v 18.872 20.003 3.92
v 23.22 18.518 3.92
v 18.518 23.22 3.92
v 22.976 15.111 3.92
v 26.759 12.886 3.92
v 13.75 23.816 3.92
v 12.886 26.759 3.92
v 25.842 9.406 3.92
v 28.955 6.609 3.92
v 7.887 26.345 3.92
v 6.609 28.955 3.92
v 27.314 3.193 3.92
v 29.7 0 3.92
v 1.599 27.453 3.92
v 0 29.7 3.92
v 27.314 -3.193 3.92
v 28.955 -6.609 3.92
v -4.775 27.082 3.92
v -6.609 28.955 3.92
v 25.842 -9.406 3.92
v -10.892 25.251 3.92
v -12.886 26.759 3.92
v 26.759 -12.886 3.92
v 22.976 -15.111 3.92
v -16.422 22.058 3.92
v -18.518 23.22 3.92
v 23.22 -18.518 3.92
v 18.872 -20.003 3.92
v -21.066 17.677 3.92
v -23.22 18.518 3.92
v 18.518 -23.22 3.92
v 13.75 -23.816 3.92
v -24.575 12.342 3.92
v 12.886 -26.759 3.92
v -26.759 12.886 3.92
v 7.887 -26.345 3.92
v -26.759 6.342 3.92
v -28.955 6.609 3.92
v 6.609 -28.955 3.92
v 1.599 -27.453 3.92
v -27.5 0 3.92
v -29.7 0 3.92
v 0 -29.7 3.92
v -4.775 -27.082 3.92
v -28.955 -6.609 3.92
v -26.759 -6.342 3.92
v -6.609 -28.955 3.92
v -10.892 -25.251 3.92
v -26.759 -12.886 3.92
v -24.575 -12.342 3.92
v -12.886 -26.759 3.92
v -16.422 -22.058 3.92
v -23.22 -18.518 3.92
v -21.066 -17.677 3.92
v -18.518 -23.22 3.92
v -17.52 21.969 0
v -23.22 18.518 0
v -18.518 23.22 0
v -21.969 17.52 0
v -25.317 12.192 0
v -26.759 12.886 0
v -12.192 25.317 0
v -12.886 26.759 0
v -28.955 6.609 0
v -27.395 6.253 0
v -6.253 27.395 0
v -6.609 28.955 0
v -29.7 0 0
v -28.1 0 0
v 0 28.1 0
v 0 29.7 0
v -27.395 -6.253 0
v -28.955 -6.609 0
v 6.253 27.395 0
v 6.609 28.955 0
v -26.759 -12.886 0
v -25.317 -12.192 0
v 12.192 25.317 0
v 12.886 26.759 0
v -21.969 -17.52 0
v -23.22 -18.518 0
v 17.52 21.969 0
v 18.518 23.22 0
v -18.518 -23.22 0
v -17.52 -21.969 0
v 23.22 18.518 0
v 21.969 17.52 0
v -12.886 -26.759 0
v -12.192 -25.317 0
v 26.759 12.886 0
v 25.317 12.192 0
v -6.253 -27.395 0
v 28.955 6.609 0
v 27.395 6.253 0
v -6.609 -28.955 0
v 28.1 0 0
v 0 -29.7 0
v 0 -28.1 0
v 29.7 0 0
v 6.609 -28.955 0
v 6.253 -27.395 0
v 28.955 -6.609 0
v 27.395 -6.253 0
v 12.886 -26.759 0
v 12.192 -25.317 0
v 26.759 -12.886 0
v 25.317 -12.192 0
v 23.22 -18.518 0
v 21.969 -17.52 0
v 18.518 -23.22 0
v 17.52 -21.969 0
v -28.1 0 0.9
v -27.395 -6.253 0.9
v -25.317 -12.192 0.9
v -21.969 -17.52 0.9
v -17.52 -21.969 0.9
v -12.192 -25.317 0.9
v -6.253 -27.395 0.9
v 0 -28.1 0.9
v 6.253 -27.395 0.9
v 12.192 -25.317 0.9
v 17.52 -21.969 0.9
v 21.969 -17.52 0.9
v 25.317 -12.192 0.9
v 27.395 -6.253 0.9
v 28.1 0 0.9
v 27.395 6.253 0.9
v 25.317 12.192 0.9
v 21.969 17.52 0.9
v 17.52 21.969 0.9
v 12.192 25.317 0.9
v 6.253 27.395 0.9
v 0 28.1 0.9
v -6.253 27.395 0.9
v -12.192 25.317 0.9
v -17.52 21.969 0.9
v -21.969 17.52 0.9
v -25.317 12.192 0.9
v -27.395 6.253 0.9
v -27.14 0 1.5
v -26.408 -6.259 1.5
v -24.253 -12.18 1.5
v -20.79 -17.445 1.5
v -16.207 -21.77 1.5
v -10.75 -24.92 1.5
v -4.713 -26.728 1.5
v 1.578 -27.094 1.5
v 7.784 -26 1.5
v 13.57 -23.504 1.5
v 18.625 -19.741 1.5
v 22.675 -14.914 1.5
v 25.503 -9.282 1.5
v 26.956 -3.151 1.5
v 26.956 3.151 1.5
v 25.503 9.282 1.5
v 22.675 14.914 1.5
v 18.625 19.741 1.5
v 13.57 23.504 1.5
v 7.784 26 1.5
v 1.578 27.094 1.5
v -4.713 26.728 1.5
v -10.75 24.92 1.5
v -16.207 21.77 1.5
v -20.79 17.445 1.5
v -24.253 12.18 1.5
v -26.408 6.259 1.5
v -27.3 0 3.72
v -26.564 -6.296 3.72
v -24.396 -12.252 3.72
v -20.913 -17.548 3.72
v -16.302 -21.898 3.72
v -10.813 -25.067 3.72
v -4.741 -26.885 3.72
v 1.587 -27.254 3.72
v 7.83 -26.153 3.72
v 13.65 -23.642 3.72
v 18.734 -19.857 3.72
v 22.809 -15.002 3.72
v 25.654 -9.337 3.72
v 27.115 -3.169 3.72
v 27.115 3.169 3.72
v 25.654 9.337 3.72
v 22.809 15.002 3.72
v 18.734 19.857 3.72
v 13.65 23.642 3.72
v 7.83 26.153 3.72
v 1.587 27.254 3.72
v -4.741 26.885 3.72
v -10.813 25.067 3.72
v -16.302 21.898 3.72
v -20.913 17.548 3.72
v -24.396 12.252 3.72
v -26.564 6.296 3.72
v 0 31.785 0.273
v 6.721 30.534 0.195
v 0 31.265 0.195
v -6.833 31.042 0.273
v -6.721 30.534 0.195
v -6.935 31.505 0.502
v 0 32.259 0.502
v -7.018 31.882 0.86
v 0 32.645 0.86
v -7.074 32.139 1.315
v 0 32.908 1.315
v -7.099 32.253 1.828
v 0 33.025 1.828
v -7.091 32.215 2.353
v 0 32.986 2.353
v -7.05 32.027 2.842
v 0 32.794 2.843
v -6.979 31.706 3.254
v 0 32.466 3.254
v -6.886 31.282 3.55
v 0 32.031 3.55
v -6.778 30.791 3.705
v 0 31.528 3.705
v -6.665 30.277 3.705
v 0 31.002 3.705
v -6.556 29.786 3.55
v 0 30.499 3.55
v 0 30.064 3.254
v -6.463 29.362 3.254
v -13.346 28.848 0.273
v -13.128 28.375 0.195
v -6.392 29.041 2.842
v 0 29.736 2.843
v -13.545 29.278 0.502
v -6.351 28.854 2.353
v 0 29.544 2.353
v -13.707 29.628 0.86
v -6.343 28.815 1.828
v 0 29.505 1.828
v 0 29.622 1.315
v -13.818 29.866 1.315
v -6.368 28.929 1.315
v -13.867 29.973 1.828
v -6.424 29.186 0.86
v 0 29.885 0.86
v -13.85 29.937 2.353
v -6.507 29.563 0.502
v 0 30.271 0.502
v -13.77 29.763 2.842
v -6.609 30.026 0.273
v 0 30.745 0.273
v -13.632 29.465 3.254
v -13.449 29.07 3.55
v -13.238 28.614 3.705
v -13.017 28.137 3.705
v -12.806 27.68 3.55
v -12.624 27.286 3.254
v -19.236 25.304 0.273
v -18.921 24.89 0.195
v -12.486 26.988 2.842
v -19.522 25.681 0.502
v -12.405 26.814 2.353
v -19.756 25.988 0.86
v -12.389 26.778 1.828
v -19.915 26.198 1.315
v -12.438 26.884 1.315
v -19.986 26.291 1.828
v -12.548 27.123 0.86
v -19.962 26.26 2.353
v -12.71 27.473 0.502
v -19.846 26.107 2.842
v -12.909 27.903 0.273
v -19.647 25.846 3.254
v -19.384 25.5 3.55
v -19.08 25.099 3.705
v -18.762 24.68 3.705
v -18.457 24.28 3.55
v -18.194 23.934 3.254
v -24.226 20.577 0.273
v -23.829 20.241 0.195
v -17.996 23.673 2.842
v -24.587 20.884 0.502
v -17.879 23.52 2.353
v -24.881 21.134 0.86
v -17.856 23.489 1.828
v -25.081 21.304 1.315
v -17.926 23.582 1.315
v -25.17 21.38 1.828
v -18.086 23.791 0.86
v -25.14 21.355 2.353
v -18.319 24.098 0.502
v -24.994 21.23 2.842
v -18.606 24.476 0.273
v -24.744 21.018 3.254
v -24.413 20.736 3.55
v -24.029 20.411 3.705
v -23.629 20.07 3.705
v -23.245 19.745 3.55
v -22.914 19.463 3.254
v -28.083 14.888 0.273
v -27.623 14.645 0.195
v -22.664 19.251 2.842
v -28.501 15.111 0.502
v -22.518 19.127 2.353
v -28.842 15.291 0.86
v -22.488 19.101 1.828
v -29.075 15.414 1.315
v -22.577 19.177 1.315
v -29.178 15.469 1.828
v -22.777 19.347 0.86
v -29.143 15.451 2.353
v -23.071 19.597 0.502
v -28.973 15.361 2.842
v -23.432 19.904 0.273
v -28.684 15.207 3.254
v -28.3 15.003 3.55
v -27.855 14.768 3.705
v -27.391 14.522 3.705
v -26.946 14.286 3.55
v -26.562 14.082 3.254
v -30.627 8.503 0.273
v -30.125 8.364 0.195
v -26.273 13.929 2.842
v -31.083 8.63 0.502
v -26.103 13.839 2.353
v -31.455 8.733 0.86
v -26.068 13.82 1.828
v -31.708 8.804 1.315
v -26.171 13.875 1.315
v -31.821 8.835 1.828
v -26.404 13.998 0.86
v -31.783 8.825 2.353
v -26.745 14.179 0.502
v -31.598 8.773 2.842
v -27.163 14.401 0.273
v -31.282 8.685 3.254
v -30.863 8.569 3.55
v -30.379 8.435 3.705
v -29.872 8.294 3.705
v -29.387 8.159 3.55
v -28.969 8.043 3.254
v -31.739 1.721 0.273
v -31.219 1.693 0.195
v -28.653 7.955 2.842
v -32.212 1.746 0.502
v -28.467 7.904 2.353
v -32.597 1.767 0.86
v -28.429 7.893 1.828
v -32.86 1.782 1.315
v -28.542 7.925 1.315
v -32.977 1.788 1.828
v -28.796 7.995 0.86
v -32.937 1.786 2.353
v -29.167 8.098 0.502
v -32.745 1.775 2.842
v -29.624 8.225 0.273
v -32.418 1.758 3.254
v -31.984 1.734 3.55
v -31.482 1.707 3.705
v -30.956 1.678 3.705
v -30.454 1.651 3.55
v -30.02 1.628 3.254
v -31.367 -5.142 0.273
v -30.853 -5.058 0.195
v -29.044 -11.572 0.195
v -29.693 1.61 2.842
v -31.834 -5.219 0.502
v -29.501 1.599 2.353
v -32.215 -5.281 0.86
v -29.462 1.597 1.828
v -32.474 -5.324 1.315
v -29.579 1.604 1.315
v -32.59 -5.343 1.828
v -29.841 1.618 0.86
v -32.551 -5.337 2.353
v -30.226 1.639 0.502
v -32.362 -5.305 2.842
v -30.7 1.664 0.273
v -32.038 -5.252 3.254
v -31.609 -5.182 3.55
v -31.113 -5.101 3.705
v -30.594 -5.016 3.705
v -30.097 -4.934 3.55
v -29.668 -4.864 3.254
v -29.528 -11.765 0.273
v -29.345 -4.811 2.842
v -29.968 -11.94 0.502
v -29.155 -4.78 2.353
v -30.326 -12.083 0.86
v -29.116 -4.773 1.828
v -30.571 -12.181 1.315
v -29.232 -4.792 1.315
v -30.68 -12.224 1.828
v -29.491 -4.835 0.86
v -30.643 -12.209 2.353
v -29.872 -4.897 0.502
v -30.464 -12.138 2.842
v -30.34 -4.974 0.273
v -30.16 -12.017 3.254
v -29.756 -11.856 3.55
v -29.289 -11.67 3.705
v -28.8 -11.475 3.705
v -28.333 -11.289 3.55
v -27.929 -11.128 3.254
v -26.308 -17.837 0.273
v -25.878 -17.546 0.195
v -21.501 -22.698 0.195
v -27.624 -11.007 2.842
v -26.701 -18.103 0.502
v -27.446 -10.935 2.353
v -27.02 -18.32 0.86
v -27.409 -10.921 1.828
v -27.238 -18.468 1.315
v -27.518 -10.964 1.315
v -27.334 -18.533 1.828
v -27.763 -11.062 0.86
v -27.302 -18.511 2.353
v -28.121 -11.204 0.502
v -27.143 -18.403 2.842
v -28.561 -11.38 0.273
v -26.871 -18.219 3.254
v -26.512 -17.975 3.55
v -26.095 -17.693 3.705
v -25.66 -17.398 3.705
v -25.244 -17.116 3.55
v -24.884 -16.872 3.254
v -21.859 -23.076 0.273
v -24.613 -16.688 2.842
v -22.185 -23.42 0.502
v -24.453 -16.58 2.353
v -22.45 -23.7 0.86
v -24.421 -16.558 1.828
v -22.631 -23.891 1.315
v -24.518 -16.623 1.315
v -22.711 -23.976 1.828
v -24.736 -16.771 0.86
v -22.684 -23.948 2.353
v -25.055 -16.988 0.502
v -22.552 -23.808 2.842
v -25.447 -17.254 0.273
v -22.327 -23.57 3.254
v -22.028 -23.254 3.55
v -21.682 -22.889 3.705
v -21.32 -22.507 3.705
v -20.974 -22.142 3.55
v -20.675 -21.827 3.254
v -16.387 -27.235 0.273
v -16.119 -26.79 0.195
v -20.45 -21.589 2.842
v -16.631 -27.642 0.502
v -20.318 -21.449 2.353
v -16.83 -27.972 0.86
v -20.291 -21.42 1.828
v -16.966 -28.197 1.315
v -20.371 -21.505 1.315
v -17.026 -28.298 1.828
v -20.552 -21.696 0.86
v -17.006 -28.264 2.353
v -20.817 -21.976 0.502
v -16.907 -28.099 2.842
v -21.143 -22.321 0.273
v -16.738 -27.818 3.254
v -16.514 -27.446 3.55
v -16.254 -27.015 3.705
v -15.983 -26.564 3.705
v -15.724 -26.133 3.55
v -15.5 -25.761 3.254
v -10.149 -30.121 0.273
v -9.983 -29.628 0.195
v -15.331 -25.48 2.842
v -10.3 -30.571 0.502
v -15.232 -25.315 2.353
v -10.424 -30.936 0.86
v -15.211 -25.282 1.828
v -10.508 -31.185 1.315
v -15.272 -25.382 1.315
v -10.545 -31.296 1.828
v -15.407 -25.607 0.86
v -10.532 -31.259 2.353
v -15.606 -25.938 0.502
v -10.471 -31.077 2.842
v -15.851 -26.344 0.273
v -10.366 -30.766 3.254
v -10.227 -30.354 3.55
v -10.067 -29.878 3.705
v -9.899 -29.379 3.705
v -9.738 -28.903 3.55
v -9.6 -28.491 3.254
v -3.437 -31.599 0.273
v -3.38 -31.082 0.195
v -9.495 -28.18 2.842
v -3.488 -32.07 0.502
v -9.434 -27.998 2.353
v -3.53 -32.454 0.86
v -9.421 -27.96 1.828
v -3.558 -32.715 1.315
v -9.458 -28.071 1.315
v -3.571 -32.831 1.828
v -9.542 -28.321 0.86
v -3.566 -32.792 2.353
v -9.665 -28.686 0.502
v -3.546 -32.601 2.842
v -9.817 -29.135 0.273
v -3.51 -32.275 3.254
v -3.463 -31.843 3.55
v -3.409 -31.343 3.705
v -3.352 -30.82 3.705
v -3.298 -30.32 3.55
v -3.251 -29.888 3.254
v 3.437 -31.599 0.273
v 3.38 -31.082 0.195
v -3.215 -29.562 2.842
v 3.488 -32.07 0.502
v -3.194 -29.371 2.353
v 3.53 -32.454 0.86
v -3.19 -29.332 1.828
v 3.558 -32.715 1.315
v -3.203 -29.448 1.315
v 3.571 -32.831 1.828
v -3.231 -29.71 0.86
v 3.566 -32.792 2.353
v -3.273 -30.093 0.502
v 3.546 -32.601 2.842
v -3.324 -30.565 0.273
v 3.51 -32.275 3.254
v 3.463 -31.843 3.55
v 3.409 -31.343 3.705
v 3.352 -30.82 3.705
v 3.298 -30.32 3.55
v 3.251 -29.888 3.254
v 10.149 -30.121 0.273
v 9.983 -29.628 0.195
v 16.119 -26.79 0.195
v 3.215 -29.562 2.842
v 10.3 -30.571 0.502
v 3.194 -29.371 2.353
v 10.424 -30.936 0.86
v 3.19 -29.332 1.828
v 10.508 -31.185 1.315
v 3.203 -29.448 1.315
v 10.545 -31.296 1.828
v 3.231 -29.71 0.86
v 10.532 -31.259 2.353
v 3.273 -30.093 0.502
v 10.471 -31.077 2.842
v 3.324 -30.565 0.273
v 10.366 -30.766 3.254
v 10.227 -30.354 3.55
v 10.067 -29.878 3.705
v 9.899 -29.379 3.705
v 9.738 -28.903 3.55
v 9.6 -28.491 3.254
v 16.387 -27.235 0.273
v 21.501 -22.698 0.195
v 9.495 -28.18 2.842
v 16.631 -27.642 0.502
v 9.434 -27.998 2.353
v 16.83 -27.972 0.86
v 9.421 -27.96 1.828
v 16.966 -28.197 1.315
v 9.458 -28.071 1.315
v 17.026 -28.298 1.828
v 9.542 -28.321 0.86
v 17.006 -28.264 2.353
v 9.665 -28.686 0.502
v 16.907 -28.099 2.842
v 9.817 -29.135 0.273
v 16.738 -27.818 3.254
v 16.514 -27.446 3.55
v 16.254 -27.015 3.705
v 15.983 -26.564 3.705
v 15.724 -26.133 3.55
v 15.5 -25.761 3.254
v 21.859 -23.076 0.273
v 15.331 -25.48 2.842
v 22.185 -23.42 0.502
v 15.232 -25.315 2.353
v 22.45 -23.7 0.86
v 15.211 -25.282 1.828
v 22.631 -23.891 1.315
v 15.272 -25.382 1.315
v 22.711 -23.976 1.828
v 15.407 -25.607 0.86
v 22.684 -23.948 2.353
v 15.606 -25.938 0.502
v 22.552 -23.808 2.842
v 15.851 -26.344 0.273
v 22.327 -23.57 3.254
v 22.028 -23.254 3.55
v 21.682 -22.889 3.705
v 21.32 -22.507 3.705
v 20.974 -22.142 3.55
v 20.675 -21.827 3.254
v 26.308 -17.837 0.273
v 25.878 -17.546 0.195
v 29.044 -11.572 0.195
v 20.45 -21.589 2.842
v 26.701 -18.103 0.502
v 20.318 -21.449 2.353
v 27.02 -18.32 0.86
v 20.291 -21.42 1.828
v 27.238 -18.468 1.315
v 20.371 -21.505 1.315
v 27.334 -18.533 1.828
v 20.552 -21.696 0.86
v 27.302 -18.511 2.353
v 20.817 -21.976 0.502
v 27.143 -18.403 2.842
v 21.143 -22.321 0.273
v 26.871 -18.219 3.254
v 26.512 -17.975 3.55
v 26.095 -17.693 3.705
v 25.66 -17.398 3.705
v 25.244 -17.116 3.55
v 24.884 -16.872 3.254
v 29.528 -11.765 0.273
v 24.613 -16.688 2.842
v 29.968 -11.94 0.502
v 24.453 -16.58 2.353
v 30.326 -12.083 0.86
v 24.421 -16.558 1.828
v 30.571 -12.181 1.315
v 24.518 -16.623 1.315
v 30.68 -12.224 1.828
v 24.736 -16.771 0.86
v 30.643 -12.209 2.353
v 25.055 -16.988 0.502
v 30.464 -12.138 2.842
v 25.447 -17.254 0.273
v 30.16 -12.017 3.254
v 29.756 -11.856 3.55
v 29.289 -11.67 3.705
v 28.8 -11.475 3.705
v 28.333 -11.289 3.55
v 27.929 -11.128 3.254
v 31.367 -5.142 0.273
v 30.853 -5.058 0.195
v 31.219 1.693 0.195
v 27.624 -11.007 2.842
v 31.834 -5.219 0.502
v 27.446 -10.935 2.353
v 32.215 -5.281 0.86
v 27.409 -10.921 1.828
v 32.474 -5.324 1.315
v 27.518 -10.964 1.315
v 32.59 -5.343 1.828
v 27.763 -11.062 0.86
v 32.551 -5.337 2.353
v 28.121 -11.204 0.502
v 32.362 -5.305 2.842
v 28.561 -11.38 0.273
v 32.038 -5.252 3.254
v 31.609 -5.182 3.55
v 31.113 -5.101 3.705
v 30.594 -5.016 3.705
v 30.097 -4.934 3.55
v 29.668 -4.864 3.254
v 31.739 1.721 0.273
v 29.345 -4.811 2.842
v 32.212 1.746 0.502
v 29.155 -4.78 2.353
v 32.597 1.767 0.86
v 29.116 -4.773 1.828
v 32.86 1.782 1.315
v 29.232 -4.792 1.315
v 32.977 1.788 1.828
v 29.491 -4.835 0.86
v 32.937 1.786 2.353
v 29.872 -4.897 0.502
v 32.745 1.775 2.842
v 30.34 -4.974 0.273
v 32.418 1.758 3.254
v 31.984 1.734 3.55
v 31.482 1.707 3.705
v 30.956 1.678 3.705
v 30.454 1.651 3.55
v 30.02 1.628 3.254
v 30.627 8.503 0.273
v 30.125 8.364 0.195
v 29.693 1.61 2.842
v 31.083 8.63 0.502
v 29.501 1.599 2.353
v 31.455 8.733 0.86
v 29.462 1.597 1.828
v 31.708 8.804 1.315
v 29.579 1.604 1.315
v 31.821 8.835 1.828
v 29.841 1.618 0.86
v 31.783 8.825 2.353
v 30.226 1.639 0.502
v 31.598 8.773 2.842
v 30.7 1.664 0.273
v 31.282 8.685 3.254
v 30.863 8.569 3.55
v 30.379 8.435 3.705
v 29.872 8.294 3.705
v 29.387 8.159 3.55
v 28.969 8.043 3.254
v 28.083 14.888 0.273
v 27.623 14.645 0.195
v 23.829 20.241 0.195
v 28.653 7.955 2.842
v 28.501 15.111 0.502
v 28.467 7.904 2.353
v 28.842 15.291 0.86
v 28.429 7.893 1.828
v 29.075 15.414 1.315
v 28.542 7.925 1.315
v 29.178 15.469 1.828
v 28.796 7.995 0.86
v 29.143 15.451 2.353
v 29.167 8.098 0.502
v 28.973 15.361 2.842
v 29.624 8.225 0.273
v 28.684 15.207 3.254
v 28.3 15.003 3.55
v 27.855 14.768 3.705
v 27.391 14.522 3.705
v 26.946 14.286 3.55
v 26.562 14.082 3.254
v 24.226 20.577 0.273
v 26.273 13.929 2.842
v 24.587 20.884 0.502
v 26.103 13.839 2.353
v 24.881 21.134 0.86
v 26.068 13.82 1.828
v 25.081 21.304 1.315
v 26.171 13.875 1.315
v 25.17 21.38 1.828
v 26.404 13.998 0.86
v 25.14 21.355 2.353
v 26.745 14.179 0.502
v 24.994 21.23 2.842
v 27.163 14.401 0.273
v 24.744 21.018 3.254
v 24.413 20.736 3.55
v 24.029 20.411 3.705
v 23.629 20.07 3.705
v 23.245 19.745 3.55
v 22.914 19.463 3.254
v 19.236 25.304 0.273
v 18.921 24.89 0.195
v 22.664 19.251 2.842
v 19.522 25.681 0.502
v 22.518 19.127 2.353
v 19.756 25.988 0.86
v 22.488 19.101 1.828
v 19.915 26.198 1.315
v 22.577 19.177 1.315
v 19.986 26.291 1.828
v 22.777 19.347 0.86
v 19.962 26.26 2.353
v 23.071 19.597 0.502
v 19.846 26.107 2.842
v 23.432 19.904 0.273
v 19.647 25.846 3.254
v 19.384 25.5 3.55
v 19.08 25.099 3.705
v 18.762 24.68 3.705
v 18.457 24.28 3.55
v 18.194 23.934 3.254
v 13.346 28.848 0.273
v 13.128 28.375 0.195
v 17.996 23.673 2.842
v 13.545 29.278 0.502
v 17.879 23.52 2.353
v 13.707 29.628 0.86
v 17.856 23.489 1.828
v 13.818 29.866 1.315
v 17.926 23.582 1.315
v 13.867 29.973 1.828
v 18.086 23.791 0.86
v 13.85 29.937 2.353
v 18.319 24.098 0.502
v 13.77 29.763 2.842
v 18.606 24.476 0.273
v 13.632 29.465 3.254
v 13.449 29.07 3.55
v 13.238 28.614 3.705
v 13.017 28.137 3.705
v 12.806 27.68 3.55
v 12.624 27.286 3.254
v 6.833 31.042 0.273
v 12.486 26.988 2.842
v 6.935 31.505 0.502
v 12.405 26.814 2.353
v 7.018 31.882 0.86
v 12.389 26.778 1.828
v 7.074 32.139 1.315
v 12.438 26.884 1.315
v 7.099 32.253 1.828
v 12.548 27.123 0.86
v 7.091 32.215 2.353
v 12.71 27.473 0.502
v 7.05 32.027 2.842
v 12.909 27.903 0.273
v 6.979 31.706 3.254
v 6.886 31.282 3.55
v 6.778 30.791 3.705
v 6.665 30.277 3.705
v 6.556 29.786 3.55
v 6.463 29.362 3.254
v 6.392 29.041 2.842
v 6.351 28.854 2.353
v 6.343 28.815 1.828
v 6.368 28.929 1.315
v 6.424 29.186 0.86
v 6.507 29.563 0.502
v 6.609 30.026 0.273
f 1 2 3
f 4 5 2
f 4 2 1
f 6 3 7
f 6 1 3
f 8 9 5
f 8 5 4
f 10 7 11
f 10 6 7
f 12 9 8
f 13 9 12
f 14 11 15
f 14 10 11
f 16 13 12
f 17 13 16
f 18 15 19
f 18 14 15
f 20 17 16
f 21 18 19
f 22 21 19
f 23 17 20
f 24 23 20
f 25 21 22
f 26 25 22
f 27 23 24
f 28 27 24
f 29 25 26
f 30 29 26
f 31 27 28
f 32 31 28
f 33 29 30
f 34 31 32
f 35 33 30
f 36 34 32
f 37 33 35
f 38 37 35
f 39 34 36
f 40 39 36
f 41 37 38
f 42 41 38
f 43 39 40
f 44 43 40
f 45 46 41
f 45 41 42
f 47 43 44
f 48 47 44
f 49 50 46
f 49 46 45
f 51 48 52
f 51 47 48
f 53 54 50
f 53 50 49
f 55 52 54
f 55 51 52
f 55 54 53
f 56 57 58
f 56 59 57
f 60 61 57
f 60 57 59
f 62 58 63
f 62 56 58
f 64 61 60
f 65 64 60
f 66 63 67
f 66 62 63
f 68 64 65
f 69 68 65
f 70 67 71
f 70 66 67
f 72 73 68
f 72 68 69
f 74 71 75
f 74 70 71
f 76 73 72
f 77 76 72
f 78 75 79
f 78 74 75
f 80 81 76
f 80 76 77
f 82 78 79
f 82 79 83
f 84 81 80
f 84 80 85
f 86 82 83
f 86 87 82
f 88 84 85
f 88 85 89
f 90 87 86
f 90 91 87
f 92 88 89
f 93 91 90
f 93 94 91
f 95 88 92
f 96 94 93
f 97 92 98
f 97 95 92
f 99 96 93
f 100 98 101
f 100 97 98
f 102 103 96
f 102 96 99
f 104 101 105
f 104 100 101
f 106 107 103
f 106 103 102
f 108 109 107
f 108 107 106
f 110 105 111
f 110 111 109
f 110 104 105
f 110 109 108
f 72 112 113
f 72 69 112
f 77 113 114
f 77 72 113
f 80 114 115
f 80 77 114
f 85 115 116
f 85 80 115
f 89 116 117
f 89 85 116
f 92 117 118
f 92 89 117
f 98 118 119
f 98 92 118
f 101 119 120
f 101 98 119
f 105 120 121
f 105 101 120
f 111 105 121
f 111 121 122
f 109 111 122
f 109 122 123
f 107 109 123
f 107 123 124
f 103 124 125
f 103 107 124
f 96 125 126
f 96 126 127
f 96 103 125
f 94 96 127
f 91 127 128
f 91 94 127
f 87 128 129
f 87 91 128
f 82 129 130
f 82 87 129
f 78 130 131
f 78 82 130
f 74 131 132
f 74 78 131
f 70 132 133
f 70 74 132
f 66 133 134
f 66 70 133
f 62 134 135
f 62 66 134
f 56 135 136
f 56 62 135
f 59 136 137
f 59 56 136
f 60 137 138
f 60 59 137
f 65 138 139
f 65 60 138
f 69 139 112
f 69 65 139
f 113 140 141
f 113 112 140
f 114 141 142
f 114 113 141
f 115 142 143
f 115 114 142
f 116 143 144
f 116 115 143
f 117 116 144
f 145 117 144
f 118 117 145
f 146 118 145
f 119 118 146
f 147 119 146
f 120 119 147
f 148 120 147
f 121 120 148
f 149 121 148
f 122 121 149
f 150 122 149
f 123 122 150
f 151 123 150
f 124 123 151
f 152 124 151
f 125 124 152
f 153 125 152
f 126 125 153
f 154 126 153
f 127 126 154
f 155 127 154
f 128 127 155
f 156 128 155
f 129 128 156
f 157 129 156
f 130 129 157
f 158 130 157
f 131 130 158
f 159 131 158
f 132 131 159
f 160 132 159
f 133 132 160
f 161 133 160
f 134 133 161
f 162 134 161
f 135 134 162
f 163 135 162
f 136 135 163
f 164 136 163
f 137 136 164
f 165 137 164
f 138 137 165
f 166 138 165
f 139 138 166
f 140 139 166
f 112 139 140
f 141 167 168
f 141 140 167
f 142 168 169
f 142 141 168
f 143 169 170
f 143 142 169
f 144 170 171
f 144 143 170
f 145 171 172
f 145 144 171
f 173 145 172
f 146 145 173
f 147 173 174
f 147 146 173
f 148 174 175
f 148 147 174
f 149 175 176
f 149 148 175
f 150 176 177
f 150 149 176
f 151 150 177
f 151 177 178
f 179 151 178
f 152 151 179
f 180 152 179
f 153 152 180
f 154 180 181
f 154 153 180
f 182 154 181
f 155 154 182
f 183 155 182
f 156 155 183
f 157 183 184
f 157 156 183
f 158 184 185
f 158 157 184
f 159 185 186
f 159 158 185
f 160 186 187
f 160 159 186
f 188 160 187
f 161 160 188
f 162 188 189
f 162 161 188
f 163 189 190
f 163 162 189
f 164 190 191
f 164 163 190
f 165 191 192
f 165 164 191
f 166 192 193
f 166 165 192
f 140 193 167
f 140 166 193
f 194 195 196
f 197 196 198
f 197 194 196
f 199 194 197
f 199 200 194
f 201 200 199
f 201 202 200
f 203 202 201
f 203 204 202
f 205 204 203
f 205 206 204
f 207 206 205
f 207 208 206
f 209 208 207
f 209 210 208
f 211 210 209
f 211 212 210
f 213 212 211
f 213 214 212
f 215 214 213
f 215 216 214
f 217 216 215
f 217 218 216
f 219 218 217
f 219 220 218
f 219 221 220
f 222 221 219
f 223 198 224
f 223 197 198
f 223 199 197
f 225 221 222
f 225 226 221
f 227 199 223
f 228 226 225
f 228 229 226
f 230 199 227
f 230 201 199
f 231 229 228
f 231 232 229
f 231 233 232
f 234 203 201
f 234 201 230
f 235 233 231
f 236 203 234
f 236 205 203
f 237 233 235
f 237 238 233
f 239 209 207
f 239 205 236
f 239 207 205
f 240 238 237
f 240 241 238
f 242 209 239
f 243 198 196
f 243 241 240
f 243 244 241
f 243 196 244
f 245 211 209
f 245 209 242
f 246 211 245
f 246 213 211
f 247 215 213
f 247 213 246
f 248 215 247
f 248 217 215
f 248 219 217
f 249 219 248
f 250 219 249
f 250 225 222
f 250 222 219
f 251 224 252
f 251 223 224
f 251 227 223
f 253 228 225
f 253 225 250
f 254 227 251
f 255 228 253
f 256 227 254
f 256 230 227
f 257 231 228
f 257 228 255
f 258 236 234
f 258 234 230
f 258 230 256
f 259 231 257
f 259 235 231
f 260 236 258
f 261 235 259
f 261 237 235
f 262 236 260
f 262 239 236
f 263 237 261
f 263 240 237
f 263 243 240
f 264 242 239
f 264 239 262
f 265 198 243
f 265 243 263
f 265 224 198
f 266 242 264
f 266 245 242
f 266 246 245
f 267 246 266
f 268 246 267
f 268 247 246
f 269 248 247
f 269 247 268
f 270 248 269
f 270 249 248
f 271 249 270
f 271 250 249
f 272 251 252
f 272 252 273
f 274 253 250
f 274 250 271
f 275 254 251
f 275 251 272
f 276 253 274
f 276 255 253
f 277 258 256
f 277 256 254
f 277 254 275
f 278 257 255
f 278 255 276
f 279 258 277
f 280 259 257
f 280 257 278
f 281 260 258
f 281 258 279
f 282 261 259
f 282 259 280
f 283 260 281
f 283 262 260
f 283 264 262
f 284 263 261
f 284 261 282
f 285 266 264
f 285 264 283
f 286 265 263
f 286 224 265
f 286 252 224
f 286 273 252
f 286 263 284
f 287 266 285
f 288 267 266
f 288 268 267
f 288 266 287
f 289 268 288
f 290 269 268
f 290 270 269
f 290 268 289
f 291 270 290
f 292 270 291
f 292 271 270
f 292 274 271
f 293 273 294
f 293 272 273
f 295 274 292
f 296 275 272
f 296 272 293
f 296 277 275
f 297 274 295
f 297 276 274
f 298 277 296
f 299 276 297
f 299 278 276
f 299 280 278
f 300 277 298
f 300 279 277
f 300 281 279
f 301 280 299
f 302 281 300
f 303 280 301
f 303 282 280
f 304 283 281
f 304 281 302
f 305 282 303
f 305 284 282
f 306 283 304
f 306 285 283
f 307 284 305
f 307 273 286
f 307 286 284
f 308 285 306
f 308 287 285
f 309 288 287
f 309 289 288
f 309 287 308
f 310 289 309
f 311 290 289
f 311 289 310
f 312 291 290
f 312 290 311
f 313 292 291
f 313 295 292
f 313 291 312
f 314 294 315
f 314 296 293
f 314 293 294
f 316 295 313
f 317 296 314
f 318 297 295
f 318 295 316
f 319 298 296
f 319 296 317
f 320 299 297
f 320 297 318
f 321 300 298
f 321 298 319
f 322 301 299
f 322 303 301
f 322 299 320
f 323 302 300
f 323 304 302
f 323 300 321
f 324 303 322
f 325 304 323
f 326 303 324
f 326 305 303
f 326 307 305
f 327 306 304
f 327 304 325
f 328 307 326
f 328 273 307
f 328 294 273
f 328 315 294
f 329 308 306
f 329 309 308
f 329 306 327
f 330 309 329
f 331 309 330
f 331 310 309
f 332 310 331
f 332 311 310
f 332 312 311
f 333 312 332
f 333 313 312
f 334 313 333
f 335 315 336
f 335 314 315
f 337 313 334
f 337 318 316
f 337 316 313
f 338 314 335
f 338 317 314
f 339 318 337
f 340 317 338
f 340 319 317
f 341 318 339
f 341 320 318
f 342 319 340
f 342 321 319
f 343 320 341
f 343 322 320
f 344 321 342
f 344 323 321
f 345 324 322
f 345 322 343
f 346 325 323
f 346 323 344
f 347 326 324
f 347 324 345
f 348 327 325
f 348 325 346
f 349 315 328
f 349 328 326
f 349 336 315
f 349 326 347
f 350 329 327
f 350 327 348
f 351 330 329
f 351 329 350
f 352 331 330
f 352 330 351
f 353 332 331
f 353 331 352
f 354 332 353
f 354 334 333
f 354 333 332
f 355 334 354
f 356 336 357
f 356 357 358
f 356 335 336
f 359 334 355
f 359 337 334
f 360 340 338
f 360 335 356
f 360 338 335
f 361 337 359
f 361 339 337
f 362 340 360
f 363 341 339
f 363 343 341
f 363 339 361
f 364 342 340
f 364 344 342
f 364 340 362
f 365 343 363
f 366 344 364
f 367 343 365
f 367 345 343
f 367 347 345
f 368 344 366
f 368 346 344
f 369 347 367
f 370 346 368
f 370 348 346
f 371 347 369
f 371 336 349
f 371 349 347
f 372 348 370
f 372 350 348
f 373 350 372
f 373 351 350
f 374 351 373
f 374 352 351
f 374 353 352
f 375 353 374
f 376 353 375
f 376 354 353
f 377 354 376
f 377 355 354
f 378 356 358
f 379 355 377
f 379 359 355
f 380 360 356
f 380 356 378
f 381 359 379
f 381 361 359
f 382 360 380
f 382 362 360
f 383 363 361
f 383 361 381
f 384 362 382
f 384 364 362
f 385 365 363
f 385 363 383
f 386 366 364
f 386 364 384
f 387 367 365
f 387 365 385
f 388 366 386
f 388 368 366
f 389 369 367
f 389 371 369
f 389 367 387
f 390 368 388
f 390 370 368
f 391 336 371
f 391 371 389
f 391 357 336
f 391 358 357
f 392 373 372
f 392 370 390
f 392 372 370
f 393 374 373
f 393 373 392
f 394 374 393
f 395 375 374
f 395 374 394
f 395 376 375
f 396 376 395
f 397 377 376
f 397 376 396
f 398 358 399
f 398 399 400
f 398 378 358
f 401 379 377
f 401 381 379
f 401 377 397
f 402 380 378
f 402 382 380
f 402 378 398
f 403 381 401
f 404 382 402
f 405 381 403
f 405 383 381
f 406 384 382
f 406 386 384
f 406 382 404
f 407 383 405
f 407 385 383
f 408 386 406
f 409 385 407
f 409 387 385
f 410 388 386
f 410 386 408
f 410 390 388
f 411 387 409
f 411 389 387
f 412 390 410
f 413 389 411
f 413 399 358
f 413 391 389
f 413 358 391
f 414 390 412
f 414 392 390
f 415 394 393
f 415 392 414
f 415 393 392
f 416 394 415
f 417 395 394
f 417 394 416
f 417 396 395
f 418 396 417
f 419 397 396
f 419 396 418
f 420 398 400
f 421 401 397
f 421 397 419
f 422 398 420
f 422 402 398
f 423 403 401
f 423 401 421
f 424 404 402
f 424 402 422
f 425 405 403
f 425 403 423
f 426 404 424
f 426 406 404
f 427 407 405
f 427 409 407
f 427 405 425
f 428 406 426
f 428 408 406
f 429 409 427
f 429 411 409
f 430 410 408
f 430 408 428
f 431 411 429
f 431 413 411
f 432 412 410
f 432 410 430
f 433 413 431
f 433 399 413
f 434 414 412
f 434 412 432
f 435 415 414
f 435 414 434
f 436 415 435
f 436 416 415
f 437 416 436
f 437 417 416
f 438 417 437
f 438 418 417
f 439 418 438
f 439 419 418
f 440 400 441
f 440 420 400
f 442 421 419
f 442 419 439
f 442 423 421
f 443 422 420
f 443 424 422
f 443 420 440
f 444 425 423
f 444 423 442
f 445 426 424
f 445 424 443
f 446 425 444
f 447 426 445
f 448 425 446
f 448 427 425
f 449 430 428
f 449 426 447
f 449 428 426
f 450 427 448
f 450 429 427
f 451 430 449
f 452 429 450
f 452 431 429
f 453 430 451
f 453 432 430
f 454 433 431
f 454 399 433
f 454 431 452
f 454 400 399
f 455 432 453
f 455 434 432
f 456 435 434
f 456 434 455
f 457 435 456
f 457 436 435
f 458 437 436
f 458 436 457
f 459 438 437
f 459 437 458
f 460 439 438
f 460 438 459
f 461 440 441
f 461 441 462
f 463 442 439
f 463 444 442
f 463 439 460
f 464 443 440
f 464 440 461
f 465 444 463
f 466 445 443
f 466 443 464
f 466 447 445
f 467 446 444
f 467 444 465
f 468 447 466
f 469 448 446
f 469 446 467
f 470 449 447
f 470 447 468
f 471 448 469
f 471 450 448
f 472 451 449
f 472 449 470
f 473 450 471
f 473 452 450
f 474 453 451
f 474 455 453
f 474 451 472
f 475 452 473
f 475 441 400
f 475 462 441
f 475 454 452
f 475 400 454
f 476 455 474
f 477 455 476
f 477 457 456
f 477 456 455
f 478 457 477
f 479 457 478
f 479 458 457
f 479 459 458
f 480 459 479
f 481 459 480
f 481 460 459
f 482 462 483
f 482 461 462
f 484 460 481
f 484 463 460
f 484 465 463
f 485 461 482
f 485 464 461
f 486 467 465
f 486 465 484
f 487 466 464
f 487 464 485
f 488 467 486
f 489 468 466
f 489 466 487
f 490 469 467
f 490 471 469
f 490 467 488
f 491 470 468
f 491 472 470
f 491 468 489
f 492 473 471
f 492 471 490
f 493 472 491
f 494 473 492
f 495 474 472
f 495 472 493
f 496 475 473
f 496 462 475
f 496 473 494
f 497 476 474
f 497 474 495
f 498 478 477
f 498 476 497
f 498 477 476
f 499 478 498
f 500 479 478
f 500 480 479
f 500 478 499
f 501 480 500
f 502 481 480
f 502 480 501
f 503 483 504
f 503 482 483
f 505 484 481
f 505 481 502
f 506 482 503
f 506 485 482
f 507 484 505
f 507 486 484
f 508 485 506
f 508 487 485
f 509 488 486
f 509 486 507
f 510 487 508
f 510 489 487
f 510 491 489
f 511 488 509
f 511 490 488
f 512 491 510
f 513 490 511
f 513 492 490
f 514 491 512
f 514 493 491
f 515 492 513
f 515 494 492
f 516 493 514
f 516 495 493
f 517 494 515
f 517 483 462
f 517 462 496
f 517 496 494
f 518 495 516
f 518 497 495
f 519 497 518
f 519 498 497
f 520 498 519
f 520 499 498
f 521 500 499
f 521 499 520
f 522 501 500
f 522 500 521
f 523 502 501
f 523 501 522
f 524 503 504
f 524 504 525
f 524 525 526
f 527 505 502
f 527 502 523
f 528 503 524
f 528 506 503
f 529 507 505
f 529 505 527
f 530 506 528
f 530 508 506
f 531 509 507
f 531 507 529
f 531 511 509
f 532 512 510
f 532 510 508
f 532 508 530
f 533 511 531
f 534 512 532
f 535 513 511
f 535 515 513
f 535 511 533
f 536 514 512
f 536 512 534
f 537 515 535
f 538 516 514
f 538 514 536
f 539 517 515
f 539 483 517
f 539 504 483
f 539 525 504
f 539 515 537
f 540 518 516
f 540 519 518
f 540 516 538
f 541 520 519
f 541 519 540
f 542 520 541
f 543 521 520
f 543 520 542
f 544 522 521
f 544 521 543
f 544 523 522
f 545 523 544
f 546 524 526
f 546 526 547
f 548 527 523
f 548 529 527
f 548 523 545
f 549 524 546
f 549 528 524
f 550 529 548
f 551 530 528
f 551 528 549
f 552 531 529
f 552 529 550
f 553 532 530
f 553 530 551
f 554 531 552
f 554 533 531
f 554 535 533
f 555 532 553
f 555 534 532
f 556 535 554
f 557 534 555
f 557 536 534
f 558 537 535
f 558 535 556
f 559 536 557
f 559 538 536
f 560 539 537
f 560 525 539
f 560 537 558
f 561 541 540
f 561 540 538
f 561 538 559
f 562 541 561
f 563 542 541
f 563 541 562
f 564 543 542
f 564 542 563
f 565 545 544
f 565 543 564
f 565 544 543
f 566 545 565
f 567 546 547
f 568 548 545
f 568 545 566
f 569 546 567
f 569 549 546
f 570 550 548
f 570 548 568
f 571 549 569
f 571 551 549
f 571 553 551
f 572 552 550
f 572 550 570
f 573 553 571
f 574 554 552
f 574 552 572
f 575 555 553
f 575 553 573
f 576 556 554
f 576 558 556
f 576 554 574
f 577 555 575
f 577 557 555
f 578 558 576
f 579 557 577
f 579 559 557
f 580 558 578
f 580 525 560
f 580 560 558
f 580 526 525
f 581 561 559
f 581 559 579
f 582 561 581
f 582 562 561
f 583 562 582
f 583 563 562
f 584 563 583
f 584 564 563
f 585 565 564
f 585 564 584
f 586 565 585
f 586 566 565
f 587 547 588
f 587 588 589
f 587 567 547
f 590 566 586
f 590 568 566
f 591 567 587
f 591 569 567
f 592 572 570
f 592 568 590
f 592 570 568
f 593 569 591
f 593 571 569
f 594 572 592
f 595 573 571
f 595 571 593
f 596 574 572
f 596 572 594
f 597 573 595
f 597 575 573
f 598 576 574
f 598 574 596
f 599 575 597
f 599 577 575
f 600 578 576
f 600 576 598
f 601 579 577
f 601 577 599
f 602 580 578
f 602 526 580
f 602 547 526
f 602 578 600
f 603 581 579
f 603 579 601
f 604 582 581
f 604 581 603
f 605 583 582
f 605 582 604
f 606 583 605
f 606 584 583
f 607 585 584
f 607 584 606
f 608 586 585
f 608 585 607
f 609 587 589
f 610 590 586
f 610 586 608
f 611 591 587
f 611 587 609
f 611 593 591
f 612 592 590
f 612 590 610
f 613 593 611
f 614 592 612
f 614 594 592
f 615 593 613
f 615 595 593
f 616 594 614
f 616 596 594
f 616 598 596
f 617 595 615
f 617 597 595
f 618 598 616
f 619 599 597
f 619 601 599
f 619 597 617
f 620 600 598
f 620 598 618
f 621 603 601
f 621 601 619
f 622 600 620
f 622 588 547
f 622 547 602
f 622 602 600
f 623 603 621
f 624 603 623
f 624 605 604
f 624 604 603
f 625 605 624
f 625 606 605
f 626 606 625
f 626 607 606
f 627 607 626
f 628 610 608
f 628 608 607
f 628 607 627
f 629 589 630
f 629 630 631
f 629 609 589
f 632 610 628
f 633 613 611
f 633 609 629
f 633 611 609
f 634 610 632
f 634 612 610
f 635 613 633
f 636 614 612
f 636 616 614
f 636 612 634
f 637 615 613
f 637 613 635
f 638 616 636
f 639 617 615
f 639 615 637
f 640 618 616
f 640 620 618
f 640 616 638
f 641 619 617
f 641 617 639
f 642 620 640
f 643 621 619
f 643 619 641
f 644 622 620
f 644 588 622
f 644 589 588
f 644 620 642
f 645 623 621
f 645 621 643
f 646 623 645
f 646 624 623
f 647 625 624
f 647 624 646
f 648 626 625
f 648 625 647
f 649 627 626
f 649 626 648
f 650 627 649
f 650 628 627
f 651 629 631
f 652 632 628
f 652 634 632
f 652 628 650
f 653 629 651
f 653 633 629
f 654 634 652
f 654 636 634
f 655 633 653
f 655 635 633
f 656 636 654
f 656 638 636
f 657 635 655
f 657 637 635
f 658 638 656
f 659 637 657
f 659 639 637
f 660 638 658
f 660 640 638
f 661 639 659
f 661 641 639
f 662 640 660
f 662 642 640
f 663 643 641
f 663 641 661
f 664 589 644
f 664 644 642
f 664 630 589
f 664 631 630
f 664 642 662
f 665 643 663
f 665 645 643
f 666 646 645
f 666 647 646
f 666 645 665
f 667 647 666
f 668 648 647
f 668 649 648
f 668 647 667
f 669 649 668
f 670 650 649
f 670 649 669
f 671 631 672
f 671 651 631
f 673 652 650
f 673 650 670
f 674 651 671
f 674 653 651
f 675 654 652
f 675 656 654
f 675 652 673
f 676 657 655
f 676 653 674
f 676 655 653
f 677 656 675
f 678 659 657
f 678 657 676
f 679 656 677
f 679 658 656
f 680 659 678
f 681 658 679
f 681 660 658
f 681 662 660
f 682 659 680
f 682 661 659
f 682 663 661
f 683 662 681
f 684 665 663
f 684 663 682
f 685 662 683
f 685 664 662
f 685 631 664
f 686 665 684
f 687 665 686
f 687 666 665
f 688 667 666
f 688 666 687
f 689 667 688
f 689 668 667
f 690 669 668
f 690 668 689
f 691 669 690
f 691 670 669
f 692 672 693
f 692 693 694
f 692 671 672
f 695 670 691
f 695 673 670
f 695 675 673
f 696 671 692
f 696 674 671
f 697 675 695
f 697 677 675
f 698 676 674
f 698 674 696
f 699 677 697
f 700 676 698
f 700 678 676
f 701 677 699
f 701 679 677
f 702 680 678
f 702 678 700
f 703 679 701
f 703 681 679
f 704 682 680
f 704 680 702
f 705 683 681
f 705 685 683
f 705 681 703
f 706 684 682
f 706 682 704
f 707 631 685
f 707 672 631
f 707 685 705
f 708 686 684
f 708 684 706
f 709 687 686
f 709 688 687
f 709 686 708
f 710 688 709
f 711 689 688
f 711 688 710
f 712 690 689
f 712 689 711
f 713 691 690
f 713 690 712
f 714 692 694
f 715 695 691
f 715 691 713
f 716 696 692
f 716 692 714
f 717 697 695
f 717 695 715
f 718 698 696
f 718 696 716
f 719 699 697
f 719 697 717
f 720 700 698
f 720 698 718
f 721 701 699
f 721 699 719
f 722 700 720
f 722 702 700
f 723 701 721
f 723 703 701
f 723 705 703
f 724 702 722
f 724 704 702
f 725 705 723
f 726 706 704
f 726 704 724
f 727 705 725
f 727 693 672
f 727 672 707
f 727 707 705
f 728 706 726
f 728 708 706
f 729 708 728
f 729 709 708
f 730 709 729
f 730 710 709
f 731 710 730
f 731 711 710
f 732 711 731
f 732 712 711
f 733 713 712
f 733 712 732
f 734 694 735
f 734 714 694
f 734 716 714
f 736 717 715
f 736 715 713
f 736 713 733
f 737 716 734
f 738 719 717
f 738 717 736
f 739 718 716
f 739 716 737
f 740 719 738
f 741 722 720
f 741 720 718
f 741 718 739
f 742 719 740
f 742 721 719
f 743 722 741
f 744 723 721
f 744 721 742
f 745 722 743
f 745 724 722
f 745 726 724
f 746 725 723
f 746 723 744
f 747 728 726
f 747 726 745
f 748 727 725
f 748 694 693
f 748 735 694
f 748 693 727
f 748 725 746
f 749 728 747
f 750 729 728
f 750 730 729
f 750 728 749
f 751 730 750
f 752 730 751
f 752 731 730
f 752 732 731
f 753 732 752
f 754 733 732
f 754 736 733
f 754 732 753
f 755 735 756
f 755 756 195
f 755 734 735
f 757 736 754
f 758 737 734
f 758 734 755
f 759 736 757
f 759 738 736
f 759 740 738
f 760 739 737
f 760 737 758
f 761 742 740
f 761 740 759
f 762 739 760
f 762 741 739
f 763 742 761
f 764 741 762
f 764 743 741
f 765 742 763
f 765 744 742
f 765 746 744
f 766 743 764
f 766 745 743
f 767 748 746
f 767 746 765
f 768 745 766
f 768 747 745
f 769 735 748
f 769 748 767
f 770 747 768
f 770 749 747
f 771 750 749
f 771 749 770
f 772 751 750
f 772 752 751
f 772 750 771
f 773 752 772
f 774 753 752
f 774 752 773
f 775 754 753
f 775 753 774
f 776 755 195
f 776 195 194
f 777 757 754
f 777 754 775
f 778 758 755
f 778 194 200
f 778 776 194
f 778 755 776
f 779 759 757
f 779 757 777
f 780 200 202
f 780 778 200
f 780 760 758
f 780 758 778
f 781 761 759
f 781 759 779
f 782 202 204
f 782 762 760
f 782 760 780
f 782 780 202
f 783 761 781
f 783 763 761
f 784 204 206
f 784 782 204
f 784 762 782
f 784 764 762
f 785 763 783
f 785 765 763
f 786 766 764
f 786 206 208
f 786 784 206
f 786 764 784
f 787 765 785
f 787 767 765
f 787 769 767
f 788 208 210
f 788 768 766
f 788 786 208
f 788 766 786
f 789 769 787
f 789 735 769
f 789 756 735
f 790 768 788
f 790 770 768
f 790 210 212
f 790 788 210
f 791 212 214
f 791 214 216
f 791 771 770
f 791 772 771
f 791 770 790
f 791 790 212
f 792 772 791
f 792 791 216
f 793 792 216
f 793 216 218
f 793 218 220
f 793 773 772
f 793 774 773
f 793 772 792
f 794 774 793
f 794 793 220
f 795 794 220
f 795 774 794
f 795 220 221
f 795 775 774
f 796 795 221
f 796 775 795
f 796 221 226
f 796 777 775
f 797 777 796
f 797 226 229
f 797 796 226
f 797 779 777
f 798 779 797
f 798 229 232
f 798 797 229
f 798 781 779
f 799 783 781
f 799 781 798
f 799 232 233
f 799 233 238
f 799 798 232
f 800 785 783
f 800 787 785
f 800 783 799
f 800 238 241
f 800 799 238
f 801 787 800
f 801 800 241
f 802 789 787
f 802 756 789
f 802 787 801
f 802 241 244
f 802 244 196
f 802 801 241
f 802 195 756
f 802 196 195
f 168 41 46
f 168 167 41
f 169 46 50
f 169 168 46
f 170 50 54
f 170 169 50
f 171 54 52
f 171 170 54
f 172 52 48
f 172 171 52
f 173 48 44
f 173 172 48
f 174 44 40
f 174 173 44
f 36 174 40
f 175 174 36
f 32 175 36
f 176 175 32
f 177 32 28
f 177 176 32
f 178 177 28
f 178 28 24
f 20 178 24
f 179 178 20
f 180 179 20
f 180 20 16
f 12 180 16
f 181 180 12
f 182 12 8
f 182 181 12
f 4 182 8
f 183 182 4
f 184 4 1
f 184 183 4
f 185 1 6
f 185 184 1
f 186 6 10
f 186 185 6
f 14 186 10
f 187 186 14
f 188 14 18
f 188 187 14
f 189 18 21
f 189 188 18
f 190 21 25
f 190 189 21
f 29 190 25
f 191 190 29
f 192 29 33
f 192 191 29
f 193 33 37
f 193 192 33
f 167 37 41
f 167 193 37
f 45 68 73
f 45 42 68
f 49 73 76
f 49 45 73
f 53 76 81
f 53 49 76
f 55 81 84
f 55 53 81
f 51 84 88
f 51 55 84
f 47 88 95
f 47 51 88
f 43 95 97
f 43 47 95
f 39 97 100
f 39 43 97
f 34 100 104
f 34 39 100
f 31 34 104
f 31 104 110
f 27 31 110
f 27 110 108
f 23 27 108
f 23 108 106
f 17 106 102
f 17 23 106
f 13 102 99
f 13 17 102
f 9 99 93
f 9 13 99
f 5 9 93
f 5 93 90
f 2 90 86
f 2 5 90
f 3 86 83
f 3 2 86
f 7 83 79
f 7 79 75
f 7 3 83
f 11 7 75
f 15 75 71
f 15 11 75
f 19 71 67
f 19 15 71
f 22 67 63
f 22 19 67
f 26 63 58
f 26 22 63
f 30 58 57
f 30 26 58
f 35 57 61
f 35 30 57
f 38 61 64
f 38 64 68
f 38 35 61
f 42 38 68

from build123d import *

# Parameters (mm, degrees)
SKETCH4_R = 1.765


with BuildPart() as part:
    # Sketch1 → Revolve1 (revolve)
    with BuildSketch(Plane(origin=(0, 0, 0), x_dir=(0, 0, -1), z_dir=(1, 0, 0))):
        Polygon((0, 28.1), (0, 29.7), (-3.92, 29.7), (-3.92, 27.5), (-3.72, 27.3), (-1.5, 27.14), (-0.9, 28.1), align=None)
    revolve(axis=Axis((0, 0, 0), (0, 0, 1)))


with BuildPart() as body_2:
    # Sketch4 → Revolve2 (revolve)
    with BuildSketch(Plane(origin=(0, 0, 0), x_dir=(0, 0, -1), z_dir=(1, 0, 0))):
        with Locations((-1.96, 31.265)):
            Circle(SKETCH4_R)
    revolve(axis=Axis((0, 0, 0), (0, 0, 1)))


solid = Compound([part.part, body_2.part])
